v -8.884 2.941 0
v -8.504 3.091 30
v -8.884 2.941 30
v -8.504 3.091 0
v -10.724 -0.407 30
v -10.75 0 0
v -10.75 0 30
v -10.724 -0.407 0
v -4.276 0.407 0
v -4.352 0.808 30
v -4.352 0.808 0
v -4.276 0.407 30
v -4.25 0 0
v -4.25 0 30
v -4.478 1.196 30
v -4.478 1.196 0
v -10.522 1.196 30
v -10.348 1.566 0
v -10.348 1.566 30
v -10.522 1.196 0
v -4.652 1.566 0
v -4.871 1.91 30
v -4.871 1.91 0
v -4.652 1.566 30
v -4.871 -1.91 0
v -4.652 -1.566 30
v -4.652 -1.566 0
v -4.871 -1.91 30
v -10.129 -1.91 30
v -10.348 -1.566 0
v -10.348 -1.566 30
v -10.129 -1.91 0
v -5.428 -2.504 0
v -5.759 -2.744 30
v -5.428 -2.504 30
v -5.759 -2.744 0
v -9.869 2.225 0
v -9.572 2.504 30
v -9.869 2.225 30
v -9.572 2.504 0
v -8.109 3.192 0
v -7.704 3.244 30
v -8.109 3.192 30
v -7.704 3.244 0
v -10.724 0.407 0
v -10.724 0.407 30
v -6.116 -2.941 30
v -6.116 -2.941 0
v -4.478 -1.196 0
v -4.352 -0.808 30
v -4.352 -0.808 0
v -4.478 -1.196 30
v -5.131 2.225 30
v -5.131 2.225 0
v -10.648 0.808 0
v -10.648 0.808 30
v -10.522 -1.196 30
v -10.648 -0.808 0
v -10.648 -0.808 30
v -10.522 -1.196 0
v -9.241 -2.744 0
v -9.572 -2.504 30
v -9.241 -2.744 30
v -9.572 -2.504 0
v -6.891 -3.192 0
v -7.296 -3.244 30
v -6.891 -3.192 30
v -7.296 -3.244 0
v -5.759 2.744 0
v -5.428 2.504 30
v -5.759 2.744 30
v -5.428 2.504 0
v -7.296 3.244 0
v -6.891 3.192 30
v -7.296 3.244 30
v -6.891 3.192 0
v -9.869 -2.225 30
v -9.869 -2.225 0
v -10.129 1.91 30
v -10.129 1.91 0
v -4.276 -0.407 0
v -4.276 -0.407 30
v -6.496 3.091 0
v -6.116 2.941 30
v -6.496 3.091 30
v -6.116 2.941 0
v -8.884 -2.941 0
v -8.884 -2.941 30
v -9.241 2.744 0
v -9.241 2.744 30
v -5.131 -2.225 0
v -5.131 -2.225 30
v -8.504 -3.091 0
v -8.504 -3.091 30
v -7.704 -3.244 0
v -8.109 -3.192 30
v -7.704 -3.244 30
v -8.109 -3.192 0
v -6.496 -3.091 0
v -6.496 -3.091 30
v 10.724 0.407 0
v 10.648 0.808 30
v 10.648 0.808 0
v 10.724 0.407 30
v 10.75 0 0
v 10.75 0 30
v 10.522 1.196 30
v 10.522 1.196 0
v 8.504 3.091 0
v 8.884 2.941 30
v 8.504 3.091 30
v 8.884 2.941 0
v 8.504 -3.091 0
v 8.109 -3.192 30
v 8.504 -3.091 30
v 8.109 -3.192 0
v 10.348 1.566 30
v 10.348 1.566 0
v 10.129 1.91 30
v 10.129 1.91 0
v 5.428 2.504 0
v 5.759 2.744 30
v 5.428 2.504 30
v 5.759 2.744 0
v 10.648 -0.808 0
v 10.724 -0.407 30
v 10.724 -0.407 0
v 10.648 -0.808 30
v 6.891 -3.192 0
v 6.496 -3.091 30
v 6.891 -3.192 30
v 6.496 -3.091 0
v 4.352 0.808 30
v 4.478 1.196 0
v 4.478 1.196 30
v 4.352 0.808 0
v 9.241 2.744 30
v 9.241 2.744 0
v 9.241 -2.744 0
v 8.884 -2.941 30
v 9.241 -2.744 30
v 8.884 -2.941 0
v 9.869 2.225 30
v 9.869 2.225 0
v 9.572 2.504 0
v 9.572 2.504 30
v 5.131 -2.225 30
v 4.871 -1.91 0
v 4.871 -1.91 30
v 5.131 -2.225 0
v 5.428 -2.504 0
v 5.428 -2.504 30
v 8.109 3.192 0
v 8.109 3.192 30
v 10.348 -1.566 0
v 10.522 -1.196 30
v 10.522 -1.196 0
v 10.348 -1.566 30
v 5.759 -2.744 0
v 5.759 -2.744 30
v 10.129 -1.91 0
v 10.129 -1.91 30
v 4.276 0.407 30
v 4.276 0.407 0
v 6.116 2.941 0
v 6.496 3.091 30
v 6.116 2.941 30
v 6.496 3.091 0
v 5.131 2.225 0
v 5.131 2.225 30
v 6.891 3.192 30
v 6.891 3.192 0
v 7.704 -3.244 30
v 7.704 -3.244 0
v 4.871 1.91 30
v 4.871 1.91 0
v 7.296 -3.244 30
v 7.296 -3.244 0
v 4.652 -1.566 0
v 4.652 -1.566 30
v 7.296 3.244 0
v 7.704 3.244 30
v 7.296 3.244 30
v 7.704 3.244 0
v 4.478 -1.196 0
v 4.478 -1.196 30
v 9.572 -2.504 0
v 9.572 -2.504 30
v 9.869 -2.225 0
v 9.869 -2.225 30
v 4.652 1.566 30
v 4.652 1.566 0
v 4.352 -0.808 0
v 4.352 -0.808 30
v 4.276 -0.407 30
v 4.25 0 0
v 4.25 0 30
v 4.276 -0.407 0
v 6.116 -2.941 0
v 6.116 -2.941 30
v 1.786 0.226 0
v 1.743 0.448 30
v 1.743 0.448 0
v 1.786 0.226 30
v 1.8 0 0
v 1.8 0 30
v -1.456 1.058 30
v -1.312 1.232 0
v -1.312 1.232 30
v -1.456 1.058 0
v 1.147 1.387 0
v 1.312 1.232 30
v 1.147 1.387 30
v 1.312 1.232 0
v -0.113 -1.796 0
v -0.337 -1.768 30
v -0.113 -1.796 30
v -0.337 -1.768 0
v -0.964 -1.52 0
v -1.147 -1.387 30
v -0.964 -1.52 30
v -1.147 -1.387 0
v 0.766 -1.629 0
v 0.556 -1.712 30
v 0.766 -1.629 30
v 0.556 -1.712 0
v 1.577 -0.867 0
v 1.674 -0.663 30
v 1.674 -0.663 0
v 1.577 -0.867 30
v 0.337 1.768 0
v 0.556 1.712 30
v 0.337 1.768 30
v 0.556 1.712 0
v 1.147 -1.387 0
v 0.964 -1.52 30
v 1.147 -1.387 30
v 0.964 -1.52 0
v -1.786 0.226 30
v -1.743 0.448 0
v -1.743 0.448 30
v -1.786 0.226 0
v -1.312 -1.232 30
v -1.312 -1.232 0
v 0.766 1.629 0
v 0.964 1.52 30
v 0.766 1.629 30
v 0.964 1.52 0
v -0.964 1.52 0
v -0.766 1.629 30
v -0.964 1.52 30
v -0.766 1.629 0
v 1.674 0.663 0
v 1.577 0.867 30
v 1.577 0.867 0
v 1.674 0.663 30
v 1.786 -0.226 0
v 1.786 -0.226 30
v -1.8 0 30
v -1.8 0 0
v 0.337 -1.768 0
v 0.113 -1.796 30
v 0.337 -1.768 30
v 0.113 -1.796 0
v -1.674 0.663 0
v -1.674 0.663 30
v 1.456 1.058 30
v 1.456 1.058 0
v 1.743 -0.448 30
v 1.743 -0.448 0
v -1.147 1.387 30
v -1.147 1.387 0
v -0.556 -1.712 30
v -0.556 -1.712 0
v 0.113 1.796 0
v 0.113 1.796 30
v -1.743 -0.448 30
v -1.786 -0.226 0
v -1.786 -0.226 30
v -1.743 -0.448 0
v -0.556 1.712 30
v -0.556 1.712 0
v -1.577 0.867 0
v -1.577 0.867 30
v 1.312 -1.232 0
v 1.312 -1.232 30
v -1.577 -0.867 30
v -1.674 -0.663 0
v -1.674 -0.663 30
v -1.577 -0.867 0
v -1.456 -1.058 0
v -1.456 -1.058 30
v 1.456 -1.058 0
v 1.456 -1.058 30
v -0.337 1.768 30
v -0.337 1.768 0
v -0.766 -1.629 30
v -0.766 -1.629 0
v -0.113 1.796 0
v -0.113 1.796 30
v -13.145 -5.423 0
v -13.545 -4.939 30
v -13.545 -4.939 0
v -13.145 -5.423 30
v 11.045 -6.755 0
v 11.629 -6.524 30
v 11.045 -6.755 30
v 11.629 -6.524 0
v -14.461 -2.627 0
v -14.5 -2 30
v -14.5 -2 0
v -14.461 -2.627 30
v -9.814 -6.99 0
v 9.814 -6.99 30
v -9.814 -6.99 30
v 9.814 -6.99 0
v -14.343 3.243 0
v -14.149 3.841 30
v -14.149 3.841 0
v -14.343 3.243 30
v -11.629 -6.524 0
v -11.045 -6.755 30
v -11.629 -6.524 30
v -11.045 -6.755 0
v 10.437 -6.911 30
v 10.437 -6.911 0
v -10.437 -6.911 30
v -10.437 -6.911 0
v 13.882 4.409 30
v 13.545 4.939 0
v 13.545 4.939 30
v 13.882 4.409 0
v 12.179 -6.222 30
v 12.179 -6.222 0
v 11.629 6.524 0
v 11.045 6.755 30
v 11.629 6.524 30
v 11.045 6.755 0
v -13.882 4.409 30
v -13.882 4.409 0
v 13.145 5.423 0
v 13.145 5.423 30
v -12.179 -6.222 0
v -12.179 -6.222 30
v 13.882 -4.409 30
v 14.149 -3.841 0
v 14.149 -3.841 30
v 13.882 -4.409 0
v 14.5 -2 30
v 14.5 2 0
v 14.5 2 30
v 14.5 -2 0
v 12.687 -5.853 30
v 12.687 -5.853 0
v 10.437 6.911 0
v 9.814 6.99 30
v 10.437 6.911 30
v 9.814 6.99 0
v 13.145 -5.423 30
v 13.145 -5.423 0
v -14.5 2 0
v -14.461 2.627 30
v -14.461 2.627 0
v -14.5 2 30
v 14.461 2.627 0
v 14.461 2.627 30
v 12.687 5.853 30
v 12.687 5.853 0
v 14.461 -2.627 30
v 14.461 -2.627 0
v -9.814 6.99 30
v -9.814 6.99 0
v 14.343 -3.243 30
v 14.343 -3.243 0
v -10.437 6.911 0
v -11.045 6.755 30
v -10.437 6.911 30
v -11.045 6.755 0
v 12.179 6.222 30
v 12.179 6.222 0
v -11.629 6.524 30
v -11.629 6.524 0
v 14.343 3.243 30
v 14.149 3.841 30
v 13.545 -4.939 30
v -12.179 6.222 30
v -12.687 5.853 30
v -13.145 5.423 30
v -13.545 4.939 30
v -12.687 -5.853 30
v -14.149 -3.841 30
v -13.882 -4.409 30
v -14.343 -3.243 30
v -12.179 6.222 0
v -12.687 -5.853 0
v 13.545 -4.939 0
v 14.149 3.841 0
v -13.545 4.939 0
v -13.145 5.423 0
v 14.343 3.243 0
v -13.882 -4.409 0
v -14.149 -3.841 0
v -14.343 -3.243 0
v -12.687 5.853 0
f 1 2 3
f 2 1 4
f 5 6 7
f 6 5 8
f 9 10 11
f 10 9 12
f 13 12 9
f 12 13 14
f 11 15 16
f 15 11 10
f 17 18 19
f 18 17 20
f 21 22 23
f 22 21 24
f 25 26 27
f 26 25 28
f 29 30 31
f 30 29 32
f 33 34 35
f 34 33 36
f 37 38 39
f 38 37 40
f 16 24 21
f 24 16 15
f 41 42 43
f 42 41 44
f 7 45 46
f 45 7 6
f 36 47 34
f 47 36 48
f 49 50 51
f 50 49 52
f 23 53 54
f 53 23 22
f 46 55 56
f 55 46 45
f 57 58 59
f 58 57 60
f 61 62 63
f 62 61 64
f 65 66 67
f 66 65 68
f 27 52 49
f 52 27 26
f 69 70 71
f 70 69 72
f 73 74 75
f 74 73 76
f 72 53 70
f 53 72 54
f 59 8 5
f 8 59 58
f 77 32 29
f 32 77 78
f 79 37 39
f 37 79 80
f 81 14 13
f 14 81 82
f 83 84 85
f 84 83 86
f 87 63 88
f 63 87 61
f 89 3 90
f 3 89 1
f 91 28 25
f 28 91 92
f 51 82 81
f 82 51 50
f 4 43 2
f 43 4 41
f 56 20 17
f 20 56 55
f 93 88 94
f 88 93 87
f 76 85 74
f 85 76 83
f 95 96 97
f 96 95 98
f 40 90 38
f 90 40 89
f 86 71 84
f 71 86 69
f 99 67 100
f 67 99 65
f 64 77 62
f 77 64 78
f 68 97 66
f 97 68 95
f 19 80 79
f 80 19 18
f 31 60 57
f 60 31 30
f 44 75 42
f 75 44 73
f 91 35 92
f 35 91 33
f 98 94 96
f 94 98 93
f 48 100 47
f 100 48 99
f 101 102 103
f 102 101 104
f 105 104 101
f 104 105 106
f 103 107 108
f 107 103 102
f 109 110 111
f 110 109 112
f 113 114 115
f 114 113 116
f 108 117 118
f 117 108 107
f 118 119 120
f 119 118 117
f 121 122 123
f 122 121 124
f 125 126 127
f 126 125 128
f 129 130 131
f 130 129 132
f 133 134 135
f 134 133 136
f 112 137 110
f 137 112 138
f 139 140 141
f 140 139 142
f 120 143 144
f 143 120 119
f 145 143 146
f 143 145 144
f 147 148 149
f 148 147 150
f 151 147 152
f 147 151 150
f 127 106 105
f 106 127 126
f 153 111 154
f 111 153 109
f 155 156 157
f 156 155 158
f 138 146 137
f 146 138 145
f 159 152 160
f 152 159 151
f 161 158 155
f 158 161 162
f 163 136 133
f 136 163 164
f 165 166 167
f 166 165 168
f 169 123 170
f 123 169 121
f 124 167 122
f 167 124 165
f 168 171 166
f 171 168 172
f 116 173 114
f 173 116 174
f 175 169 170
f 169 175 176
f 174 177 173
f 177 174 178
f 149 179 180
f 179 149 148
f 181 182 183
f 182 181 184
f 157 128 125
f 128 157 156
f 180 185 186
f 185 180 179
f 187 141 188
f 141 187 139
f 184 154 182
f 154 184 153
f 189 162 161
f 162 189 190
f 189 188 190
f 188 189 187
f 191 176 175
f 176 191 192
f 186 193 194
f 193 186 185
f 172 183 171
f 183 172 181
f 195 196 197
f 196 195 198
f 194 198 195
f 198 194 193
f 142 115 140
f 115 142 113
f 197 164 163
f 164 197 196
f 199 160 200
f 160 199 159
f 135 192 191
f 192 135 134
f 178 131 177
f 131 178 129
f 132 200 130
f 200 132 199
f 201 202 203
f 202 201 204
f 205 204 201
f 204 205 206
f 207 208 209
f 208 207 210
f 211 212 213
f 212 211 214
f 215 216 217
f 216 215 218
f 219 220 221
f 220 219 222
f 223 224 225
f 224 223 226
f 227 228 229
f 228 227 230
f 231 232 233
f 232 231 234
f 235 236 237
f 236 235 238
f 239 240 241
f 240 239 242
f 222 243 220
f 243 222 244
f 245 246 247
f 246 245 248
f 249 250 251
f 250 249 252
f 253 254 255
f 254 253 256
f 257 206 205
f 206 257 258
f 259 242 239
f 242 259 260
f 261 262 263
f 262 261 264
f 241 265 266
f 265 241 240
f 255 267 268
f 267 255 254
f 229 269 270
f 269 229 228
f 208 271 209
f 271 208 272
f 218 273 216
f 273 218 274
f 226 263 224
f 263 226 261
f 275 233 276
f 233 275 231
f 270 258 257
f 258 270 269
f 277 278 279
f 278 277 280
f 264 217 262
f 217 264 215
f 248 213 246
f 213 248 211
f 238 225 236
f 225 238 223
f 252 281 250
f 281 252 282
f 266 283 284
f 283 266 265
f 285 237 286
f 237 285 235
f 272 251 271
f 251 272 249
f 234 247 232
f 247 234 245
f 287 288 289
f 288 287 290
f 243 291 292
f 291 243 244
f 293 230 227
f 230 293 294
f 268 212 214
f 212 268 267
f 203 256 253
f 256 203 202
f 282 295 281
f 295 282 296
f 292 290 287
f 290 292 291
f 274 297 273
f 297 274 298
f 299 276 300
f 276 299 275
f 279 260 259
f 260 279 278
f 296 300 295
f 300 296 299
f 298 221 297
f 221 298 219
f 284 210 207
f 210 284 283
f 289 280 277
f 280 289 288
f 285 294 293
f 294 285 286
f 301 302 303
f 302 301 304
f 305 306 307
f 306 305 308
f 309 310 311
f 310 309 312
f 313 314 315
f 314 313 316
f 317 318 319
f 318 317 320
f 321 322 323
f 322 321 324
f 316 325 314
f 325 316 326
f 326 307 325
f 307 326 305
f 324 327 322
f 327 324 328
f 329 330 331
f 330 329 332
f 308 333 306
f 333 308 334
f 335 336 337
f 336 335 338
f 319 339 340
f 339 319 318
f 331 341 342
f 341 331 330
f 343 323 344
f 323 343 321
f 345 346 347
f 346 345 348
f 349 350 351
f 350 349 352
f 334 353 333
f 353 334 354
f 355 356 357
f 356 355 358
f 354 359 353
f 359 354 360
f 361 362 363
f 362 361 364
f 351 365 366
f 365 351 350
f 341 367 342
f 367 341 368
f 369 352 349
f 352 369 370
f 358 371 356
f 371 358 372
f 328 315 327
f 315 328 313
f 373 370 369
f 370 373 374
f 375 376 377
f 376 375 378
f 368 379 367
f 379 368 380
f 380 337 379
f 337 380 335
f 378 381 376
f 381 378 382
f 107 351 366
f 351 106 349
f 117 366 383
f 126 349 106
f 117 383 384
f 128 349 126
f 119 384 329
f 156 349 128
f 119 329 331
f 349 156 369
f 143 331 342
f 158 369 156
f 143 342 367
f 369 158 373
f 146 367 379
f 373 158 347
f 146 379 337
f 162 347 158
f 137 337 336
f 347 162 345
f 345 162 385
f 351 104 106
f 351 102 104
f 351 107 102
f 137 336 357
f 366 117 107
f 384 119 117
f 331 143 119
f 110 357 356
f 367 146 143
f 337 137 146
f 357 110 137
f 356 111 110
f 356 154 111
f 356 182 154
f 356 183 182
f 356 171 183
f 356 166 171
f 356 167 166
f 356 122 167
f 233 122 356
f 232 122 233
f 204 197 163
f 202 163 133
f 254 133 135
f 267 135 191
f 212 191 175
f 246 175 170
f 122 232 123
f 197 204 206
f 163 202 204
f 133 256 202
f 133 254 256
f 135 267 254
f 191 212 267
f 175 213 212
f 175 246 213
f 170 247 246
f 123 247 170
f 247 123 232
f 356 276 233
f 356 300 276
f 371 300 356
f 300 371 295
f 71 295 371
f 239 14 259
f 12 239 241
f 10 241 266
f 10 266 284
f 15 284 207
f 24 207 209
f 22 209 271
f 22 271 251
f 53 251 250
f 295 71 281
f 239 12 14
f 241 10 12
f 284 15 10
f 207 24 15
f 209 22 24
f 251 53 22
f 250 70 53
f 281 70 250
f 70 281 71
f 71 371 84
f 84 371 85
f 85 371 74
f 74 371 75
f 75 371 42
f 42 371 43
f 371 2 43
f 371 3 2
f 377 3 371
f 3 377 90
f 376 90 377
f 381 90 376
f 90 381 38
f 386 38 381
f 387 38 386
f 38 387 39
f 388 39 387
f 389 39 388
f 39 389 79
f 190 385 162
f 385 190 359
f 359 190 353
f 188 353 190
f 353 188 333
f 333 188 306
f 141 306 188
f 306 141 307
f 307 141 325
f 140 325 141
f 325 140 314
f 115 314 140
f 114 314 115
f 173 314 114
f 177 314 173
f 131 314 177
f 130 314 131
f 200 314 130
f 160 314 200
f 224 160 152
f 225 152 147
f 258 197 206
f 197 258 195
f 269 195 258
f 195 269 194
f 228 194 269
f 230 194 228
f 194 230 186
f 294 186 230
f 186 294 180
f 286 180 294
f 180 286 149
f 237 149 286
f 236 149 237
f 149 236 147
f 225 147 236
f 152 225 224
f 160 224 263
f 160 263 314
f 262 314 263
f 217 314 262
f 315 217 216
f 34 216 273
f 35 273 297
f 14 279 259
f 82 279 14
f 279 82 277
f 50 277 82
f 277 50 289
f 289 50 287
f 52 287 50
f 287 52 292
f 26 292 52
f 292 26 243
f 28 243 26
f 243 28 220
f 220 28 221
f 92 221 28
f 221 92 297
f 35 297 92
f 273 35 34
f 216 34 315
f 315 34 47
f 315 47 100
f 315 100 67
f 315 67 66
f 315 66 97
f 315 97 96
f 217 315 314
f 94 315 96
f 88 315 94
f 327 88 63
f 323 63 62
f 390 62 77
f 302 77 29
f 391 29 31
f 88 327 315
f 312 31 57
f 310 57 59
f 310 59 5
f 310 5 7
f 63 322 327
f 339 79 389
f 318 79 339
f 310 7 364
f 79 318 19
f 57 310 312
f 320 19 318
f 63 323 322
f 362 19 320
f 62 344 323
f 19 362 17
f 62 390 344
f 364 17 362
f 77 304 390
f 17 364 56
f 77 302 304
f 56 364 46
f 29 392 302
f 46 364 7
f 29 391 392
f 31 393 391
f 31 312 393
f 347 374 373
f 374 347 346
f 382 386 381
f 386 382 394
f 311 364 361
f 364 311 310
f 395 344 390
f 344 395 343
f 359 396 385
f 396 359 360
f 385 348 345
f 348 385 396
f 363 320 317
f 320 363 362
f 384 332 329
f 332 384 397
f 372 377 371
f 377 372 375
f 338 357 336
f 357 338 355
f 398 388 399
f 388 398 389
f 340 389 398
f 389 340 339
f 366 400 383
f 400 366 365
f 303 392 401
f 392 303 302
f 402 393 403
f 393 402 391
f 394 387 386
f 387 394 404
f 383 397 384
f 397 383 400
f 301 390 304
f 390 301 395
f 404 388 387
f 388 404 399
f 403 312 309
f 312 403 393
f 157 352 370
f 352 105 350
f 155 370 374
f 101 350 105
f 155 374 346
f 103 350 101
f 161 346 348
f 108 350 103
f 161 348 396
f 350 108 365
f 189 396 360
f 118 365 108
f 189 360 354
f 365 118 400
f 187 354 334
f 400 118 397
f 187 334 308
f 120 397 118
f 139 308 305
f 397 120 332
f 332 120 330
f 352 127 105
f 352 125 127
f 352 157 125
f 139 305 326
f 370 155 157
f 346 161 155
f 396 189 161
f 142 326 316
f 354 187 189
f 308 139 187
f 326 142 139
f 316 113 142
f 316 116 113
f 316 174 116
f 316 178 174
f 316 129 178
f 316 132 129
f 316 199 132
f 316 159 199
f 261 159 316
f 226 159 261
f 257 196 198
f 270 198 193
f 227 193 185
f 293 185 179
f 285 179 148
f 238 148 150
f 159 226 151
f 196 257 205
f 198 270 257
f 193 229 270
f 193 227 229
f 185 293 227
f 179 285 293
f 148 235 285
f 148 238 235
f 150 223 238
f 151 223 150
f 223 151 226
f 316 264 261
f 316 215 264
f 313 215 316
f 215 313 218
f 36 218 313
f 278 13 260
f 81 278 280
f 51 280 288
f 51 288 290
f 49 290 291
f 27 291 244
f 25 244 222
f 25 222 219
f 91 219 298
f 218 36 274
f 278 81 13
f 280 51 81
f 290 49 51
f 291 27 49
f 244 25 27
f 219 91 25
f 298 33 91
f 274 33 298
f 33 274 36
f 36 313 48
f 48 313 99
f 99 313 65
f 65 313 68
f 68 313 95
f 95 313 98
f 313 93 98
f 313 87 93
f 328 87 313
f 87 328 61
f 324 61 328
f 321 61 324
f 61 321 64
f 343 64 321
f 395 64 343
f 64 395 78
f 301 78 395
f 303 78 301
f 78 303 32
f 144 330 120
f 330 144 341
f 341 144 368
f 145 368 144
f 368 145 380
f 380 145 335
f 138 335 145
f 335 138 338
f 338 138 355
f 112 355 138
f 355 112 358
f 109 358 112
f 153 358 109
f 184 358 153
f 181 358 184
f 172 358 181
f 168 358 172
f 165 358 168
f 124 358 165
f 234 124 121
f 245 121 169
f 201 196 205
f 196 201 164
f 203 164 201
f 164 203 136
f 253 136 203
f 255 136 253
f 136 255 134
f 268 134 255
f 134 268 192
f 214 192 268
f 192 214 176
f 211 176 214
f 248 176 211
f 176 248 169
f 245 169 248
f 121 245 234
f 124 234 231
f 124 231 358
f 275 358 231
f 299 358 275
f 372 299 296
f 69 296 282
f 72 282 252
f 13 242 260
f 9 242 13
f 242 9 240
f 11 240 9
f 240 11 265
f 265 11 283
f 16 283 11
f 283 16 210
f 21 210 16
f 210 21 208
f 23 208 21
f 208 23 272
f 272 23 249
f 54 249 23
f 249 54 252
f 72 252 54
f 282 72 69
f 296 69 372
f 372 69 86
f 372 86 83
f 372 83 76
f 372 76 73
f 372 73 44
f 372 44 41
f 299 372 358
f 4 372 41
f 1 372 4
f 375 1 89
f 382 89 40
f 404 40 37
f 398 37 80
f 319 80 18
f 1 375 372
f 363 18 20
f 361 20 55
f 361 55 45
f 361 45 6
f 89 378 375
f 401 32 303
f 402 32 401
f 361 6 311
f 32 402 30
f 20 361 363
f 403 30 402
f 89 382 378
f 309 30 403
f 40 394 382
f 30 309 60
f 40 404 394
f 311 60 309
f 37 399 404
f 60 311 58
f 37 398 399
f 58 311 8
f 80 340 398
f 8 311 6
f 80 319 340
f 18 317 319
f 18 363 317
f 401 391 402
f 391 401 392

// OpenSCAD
$fn = 50;


difference() {
	union() {
		hull() {
			translate(v = [-9.5000000000, 2.0000000000, 0]) {
				cylinder(h = 30, r = 5);
			}
			translate(v = [9.5000000000, 2.0000000000, 0]) {
				cylinder(h = 30, r = 5);
			}
			translate(v = [-9.5000000000, -2.0000000000, 0]) {
				cylinder(h = 30, r = 5);
			}
			translate(v = [9.5000000000, -2.0000000000, 0]) {
				cylinder(h = 30, r = 5);
			}
		}
	}
	union() {
		translate(v = [-7.5000000000, 0.0000000000, 0]) {
			translate(v = [0, 0, -100]) {
				cylinder(h = 200, r = 3.2500000000);
			}
		}
		translate(v = [7.5000000000, 0.0000000000, 0]) {
			translate(v = [0, 0, -100]) {
				cylinder(h = 200, r = 3.2500000000);
			}
		}
		translate(v = [-7.5000000000, 0.0000000000, 0]) {
			translate(v = [0, 0, -100]) {
				cylinder(h = 200, r = 1.8000000000);
			}
		}
		translate(v = [0, 0, -100]) {
			cylinder(h = 200, r = 1.8000000000);
		}
		translate(v = [7.5000000000, 0.0000000000, 0]) {
			translate(v = [0, 0, -100]) {
				cylinder(h = 200, r = 1.8000000000);
			}
		}
	}
}
